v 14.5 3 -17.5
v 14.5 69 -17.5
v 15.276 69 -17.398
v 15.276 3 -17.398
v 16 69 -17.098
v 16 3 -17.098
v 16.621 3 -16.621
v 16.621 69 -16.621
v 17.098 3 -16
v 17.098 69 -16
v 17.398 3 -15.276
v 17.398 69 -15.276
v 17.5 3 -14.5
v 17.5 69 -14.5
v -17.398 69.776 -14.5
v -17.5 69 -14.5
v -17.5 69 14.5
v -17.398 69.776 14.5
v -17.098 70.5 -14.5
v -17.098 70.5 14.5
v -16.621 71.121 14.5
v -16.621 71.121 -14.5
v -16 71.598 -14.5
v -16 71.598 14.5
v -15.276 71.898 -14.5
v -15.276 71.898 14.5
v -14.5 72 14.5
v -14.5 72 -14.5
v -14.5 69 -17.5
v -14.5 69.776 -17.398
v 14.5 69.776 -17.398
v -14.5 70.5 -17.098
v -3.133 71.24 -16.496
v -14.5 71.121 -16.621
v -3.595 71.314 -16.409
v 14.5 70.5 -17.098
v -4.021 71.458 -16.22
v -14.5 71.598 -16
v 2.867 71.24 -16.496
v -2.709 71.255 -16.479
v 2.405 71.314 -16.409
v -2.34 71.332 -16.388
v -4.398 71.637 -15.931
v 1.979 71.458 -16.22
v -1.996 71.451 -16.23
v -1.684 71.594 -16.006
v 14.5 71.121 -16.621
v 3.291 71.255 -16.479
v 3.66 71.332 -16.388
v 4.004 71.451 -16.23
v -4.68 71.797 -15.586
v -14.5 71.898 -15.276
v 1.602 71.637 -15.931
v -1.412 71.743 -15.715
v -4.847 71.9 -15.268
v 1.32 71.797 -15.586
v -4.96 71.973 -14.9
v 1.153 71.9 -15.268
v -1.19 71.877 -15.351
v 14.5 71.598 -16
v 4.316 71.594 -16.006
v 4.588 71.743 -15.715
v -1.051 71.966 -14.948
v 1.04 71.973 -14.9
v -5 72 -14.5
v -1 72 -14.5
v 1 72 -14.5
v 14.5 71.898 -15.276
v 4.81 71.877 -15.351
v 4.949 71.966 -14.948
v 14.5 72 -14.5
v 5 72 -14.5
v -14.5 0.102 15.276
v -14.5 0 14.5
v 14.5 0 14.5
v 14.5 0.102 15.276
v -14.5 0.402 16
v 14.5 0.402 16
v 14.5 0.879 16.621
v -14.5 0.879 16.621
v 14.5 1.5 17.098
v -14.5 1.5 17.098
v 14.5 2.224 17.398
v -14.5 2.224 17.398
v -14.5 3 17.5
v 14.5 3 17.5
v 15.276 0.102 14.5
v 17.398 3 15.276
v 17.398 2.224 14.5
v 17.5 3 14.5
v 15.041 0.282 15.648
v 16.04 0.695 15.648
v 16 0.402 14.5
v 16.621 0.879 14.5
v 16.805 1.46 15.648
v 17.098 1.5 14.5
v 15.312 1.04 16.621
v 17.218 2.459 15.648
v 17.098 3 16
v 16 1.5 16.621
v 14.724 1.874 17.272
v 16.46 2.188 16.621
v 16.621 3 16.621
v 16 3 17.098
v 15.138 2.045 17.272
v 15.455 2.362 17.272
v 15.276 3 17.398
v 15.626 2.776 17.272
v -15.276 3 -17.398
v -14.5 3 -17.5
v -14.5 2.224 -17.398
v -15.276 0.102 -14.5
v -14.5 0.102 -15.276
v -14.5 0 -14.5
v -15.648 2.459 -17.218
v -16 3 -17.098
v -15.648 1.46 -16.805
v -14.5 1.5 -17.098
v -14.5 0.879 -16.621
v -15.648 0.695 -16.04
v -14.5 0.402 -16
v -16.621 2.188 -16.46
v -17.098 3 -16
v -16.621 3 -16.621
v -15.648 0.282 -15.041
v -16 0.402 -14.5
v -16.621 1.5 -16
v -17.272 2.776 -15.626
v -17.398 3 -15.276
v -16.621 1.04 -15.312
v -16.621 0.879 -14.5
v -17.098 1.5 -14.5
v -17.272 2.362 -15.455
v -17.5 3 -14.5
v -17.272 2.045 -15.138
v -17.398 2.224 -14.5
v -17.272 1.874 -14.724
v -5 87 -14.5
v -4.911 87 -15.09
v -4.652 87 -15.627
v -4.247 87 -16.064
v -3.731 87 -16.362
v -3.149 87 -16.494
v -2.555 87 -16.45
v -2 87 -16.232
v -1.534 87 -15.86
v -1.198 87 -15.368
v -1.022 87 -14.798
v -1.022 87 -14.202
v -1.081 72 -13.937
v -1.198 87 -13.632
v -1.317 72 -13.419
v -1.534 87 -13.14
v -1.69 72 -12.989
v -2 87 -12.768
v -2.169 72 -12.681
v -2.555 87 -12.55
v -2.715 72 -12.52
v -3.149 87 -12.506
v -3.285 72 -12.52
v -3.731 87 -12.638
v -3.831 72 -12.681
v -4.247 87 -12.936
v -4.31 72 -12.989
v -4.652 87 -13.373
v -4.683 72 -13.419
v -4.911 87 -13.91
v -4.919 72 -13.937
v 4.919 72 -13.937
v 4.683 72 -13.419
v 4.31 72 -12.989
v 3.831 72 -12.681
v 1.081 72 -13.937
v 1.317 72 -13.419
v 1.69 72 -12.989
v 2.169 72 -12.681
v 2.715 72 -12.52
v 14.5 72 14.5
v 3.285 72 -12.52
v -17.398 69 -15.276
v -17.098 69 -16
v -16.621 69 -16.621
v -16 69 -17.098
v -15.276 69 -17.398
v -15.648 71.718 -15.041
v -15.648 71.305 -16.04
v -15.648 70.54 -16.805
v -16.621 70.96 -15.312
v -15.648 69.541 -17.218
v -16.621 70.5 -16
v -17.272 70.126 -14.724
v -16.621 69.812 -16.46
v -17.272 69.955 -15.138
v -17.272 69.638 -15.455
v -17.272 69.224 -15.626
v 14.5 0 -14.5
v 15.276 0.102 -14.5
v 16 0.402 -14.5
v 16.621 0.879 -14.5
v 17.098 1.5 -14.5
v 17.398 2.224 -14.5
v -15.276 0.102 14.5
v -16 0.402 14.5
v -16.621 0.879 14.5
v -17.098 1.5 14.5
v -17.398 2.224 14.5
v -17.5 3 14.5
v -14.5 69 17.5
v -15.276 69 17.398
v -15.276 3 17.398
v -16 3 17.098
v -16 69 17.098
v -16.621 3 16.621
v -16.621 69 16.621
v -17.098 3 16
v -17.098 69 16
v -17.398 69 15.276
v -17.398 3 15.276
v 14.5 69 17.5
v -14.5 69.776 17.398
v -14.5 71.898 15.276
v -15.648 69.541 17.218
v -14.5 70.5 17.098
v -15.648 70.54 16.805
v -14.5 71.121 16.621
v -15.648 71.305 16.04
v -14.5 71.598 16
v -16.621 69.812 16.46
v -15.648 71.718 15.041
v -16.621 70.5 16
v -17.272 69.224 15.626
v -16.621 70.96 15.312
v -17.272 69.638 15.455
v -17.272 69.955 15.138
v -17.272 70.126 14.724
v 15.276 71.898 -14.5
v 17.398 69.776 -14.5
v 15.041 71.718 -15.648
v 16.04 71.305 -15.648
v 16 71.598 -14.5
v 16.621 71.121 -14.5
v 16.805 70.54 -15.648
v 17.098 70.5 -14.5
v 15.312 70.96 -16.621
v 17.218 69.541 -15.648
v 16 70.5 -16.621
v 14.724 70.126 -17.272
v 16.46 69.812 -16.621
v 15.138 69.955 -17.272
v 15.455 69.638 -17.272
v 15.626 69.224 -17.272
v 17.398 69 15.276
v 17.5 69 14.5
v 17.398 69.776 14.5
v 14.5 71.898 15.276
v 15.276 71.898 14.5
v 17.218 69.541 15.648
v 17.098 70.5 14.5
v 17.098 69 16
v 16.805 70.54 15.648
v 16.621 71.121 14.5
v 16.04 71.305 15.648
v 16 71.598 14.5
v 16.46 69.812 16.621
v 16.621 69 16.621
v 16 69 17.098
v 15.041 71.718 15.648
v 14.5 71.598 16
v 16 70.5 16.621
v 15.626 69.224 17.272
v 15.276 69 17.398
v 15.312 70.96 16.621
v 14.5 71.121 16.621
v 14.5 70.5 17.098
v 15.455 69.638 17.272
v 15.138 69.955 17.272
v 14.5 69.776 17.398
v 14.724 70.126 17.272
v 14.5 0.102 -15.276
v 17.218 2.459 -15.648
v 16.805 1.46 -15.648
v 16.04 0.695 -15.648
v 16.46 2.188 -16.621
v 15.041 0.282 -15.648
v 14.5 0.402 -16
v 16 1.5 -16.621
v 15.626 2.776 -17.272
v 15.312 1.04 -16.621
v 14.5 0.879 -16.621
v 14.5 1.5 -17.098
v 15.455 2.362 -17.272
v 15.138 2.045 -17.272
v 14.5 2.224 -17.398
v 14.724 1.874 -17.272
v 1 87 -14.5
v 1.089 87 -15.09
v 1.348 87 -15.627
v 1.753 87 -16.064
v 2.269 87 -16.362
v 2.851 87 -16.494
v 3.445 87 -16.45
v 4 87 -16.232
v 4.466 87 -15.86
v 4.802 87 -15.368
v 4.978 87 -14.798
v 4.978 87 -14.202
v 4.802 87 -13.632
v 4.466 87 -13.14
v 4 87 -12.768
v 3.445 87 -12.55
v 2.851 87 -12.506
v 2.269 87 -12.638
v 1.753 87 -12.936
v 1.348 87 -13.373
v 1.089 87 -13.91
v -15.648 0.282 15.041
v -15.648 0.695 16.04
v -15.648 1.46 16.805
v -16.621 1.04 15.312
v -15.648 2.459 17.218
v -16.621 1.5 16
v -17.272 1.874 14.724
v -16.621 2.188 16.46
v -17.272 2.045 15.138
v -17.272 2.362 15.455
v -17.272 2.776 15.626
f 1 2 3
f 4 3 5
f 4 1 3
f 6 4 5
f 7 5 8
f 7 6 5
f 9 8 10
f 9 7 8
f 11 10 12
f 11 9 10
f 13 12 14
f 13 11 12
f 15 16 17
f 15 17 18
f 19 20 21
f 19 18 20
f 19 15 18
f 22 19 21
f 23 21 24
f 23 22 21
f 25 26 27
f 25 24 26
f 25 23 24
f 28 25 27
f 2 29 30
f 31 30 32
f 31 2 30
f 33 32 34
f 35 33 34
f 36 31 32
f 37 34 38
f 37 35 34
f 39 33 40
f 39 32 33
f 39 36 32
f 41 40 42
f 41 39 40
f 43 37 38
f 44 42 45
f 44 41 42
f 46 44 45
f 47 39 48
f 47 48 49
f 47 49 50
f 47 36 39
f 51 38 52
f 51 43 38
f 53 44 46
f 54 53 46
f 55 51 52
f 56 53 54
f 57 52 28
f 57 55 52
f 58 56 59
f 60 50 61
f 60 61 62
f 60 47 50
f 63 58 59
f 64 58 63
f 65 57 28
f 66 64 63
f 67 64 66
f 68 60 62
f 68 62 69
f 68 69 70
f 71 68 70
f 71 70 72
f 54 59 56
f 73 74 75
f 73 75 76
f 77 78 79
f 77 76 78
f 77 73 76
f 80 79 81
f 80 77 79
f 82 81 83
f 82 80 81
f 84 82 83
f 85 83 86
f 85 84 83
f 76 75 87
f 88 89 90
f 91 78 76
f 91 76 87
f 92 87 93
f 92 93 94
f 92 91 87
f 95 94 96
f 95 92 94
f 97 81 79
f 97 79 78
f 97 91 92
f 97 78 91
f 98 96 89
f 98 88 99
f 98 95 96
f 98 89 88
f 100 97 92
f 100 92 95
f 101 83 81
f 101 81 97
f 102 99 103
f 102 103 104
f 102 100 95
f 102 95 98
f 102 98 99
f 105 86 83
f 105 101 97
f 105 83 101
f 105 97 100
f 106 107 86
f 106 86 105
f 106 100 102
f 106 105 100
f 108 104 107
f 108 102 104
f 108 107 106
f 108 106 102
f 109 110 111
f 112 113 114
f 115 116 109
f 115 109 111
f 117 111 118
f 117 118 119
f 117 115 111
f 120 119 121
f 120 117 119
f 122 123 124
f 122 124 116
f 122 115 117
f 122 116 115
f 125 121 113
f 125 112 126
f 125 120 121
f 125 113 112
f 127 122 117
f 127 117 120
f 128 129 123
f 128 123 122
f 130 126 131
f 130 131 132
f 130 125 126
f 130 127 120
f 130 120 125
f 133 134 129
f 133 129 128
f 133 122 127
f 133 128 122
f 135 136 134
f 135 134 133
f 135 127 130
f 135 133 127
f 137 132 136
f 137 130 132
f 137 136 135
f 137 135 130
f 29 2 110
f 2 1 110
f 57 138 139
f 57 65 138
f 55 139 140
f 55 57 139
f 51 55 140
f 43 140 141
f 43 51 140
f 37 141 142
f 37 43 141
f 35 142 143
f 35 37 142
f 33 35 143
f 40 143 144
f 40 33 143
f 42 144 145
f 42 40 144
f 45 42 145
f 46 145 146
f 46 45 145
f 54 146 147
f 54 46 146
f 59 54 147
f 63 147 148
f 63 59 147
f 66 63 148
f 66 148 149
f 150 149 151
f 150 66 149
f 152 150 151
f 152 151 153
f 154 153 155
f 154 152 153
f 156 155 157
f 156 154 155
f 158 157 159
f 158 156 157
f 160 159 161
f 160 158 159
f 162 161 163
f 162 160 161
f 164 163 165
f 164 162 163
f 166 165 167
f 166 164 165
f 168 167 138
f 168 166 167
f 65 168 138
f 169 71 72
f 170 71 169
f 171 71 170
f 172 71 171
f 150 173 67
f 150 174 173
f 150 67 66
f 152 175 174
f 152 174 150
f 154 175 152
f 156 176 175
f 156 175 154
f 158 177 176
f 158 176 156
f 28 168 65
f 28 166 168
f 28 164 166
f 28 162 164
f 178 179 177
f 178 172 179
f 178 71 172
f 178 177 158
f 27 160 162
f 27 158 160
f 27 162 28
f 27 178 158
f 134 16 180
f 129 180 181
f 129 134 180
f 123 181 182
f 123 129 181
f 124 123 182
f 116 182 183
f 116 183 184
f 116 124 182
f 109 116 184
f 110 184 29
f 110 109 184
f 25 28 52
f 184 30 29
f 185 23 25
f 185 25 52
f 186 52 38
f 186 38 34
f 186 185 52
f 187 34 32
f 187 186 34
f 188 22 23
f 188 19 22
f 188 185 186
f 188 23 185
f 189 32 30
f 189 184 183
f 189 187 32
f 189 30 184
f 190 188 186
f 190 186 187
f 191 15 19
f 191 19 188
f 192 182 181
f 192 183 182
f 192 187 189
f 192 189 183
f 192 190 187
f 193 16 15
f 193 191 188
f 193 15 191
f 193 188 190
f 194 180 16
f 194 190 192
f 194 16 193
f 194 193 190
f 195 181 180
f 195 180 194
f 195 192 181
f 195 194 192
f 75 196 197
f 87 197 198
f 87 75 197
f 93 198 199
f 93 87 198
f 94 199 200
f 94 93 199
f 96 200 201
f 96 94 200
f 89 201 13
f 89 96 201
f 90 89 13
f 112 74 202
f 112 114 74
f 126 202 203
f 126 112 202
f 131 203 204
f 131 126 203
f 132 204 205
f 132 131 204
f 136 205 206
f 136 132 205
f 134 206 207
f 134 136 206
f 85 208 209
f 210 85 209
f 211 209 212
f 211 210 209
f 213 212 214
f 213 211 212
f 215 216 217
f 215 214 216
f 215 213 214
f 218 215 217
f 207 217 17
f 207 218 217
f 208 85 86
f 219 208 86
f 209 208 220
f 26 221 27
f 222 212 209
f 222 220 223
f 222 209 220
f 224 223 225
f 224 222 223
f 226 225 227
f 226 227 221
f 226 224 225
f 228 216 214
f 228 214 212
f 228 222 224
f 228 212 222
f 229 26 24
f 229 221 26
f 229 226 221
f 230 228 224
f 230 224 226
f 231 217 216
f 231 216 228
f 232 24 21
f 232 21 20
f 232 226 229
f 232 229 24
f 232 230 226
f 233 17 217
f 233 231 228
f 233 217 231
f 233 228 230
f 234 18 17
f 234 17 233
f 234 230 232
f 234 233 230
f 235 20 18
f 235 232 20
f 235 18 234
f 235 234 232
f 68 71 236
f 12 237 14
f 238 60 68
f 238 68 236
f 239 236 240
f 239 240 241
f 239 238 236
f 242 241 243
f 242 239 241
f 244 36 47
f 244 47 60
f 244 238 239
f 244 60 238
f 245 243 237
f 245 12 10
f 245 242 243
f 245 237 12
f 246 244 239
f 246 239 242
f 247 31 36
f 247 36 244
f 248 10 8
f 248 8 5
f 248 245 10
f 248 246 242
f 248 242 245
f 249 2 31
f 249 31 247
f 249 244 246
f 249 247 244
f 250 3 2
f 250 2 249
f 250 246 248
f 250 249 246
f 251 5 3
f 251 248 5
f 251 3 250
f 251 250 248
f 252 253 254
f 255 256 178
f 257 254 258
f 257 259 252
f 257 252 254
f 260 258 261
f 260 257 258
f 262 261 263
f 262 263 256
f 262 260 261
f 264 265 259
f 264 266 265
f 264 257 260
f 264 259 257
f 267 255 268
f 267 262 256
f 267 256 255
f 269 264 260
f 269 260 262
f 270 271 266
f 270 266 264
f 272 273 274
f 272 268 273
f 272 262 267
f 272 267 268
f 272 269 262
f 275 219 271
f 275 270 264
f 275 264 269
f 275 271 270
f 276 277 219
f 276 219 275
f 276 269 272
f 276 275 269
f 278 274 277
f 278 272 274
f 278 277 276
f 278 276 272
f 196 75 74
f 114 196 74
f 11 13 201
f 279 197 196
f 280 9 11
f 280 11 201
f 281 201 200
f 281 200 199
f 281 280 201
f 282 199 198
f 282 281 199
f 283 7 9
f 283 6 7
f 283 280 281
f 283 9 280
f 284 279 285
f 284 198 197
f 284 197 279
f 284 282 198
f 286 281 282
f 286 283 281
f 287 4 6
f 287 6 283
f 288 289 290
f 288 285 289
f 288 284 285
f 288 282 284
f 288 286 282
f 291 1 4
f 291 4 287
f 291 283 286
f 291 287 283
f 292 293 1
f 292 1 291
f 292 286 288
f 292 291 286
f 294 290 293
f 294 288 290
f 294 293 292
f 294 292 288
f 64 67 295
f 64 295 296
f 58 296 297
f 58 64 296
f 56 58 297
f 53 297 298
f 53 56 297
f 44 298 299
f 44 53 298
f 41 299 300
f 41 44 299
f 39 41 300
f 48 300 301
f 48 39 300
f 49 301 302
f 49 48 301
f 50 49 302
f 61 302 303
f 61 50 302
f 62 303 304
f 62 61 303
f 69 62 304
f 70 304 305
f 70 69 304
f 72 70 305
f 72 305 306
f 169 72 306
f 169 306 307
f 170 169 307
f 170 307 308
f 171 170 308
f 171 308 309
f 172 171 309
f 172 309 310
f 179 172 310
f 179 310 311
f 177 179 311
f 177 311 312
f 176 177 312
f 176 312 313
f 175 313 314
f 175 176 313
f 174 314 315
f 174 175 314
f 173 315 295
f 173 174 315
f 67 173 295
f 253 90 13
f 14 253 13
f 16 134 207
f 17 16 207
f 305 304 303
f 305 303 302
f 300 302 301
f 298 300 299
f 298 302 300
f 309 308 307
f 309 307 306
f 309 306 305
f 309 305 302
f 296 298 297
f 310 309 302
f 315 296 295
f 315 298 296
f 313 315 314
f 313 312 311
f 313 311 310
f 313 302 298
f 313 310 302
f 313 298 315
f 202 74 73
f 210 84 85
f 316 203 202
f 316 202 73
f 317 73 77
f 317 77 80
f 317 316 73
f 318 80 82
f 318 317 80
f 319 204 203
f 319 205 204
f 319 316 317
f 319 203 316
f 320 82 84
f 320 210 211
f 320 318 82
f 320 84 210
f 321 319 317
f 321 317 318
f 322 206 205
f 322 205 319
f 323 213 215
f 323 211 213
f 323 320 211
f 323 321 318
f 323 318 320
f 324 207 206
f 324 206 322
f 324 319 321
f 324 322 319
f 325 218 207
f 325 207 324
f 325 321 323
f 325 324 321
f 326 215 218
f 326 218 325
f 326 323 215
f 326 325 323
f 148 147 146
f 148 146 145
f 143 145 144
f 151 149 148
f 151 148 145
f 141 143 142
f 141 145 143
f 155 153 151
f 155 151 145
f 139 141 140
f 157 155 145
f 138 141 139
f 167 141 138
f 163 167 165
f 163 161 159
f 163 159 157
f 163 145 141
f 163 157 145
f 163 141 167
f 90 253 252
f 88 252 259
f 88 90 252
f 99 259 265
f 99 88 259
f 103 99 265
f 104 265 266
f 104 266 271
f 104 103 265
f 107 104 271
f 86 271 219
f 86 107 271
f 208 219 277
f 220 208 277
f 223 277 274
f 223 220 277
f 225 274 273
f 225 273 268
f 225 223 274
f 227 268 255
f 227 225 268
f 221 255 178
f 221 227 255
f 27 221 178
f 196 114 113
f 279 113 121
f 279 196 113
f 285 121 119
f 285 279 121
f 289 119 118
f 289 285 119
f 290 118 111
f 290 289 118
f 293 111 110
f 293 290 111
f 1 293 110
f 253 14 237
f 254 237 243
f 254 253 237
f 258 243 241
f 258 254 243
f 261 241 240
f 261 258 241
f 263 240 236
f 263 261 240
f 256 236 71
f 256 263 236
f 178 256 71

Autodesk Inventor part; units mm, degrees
ref_plane "YZ Plane" through (0, 0, 0) normal (1, 0, 0) x (0, 1, 0)
ref_plane "XZ Plane" through (0, 0, 0) normal (0, 1, 0) x (-1, 0, 0)
ref_plane "XY Plane" through (0, 0, 0) normal (0, 0, 1) x (1, 0, 0)
sketch "Sketch1" plane through (0, 0, 0) normal (0, 1, 0) x (-1, 0, 0)
  line L0 (17.5, 17.5) -> (-17.5, 17.5)
  line L1 (-17.5, 17.5) -> (-17.5, -17.5)
  line L2 (-17.5, -17.5) -> (17.5, -17.5)
  line L3 (17.5, -17.5) -> (17.5, 17.5)
  line L4 (17.5, 17.5) -> (-17.5, -17.5) construction
  line L5 (-17.5, 17.5) -> (17.5, -17.5) construction
  line L6 (0, -17.5) -> (0, -14.5) construction
  line L7 (0, -14.5) -> (3, -14.5) construction
  circle A0 centre (3, -14.5) radius 2
  circle A1 centre (-3, -14.5) radius 2
  point P0 (0, 0)
  dimension "d0" = 35
  dimension "d1" = 35
  dimension "d5" = 3
  dimension "d6" = 3
  dimension "d7" = 4
extrude "Extrusion1" add sketch "Sketch1" along normal blind 72 contours L3 L2 L1 L0 | A0 | A1
extrude "Extrusion2" add sketch "Sketch1" along normal blind 15 from surface at 72 contours A0 | A1
fillet "Fillet1" radius 3 12 edges at (17.5, 36, 17.5) (17.5, 36, -17.5) (-17.5, 36, 17.5) (-17.5, 36, -17.5) (17.5, 72, 0) (0, 72, 17.5) (0, 72, -17.5) (-17.5, 72, 0) (17.5, 0, 0) (0, 0, 17.5) (-17.5, 0, 0) (0, 0, -17.5)
properties part number "Tattu 14,8V 1550 mAh 100C LiPo-Akku XT60"
